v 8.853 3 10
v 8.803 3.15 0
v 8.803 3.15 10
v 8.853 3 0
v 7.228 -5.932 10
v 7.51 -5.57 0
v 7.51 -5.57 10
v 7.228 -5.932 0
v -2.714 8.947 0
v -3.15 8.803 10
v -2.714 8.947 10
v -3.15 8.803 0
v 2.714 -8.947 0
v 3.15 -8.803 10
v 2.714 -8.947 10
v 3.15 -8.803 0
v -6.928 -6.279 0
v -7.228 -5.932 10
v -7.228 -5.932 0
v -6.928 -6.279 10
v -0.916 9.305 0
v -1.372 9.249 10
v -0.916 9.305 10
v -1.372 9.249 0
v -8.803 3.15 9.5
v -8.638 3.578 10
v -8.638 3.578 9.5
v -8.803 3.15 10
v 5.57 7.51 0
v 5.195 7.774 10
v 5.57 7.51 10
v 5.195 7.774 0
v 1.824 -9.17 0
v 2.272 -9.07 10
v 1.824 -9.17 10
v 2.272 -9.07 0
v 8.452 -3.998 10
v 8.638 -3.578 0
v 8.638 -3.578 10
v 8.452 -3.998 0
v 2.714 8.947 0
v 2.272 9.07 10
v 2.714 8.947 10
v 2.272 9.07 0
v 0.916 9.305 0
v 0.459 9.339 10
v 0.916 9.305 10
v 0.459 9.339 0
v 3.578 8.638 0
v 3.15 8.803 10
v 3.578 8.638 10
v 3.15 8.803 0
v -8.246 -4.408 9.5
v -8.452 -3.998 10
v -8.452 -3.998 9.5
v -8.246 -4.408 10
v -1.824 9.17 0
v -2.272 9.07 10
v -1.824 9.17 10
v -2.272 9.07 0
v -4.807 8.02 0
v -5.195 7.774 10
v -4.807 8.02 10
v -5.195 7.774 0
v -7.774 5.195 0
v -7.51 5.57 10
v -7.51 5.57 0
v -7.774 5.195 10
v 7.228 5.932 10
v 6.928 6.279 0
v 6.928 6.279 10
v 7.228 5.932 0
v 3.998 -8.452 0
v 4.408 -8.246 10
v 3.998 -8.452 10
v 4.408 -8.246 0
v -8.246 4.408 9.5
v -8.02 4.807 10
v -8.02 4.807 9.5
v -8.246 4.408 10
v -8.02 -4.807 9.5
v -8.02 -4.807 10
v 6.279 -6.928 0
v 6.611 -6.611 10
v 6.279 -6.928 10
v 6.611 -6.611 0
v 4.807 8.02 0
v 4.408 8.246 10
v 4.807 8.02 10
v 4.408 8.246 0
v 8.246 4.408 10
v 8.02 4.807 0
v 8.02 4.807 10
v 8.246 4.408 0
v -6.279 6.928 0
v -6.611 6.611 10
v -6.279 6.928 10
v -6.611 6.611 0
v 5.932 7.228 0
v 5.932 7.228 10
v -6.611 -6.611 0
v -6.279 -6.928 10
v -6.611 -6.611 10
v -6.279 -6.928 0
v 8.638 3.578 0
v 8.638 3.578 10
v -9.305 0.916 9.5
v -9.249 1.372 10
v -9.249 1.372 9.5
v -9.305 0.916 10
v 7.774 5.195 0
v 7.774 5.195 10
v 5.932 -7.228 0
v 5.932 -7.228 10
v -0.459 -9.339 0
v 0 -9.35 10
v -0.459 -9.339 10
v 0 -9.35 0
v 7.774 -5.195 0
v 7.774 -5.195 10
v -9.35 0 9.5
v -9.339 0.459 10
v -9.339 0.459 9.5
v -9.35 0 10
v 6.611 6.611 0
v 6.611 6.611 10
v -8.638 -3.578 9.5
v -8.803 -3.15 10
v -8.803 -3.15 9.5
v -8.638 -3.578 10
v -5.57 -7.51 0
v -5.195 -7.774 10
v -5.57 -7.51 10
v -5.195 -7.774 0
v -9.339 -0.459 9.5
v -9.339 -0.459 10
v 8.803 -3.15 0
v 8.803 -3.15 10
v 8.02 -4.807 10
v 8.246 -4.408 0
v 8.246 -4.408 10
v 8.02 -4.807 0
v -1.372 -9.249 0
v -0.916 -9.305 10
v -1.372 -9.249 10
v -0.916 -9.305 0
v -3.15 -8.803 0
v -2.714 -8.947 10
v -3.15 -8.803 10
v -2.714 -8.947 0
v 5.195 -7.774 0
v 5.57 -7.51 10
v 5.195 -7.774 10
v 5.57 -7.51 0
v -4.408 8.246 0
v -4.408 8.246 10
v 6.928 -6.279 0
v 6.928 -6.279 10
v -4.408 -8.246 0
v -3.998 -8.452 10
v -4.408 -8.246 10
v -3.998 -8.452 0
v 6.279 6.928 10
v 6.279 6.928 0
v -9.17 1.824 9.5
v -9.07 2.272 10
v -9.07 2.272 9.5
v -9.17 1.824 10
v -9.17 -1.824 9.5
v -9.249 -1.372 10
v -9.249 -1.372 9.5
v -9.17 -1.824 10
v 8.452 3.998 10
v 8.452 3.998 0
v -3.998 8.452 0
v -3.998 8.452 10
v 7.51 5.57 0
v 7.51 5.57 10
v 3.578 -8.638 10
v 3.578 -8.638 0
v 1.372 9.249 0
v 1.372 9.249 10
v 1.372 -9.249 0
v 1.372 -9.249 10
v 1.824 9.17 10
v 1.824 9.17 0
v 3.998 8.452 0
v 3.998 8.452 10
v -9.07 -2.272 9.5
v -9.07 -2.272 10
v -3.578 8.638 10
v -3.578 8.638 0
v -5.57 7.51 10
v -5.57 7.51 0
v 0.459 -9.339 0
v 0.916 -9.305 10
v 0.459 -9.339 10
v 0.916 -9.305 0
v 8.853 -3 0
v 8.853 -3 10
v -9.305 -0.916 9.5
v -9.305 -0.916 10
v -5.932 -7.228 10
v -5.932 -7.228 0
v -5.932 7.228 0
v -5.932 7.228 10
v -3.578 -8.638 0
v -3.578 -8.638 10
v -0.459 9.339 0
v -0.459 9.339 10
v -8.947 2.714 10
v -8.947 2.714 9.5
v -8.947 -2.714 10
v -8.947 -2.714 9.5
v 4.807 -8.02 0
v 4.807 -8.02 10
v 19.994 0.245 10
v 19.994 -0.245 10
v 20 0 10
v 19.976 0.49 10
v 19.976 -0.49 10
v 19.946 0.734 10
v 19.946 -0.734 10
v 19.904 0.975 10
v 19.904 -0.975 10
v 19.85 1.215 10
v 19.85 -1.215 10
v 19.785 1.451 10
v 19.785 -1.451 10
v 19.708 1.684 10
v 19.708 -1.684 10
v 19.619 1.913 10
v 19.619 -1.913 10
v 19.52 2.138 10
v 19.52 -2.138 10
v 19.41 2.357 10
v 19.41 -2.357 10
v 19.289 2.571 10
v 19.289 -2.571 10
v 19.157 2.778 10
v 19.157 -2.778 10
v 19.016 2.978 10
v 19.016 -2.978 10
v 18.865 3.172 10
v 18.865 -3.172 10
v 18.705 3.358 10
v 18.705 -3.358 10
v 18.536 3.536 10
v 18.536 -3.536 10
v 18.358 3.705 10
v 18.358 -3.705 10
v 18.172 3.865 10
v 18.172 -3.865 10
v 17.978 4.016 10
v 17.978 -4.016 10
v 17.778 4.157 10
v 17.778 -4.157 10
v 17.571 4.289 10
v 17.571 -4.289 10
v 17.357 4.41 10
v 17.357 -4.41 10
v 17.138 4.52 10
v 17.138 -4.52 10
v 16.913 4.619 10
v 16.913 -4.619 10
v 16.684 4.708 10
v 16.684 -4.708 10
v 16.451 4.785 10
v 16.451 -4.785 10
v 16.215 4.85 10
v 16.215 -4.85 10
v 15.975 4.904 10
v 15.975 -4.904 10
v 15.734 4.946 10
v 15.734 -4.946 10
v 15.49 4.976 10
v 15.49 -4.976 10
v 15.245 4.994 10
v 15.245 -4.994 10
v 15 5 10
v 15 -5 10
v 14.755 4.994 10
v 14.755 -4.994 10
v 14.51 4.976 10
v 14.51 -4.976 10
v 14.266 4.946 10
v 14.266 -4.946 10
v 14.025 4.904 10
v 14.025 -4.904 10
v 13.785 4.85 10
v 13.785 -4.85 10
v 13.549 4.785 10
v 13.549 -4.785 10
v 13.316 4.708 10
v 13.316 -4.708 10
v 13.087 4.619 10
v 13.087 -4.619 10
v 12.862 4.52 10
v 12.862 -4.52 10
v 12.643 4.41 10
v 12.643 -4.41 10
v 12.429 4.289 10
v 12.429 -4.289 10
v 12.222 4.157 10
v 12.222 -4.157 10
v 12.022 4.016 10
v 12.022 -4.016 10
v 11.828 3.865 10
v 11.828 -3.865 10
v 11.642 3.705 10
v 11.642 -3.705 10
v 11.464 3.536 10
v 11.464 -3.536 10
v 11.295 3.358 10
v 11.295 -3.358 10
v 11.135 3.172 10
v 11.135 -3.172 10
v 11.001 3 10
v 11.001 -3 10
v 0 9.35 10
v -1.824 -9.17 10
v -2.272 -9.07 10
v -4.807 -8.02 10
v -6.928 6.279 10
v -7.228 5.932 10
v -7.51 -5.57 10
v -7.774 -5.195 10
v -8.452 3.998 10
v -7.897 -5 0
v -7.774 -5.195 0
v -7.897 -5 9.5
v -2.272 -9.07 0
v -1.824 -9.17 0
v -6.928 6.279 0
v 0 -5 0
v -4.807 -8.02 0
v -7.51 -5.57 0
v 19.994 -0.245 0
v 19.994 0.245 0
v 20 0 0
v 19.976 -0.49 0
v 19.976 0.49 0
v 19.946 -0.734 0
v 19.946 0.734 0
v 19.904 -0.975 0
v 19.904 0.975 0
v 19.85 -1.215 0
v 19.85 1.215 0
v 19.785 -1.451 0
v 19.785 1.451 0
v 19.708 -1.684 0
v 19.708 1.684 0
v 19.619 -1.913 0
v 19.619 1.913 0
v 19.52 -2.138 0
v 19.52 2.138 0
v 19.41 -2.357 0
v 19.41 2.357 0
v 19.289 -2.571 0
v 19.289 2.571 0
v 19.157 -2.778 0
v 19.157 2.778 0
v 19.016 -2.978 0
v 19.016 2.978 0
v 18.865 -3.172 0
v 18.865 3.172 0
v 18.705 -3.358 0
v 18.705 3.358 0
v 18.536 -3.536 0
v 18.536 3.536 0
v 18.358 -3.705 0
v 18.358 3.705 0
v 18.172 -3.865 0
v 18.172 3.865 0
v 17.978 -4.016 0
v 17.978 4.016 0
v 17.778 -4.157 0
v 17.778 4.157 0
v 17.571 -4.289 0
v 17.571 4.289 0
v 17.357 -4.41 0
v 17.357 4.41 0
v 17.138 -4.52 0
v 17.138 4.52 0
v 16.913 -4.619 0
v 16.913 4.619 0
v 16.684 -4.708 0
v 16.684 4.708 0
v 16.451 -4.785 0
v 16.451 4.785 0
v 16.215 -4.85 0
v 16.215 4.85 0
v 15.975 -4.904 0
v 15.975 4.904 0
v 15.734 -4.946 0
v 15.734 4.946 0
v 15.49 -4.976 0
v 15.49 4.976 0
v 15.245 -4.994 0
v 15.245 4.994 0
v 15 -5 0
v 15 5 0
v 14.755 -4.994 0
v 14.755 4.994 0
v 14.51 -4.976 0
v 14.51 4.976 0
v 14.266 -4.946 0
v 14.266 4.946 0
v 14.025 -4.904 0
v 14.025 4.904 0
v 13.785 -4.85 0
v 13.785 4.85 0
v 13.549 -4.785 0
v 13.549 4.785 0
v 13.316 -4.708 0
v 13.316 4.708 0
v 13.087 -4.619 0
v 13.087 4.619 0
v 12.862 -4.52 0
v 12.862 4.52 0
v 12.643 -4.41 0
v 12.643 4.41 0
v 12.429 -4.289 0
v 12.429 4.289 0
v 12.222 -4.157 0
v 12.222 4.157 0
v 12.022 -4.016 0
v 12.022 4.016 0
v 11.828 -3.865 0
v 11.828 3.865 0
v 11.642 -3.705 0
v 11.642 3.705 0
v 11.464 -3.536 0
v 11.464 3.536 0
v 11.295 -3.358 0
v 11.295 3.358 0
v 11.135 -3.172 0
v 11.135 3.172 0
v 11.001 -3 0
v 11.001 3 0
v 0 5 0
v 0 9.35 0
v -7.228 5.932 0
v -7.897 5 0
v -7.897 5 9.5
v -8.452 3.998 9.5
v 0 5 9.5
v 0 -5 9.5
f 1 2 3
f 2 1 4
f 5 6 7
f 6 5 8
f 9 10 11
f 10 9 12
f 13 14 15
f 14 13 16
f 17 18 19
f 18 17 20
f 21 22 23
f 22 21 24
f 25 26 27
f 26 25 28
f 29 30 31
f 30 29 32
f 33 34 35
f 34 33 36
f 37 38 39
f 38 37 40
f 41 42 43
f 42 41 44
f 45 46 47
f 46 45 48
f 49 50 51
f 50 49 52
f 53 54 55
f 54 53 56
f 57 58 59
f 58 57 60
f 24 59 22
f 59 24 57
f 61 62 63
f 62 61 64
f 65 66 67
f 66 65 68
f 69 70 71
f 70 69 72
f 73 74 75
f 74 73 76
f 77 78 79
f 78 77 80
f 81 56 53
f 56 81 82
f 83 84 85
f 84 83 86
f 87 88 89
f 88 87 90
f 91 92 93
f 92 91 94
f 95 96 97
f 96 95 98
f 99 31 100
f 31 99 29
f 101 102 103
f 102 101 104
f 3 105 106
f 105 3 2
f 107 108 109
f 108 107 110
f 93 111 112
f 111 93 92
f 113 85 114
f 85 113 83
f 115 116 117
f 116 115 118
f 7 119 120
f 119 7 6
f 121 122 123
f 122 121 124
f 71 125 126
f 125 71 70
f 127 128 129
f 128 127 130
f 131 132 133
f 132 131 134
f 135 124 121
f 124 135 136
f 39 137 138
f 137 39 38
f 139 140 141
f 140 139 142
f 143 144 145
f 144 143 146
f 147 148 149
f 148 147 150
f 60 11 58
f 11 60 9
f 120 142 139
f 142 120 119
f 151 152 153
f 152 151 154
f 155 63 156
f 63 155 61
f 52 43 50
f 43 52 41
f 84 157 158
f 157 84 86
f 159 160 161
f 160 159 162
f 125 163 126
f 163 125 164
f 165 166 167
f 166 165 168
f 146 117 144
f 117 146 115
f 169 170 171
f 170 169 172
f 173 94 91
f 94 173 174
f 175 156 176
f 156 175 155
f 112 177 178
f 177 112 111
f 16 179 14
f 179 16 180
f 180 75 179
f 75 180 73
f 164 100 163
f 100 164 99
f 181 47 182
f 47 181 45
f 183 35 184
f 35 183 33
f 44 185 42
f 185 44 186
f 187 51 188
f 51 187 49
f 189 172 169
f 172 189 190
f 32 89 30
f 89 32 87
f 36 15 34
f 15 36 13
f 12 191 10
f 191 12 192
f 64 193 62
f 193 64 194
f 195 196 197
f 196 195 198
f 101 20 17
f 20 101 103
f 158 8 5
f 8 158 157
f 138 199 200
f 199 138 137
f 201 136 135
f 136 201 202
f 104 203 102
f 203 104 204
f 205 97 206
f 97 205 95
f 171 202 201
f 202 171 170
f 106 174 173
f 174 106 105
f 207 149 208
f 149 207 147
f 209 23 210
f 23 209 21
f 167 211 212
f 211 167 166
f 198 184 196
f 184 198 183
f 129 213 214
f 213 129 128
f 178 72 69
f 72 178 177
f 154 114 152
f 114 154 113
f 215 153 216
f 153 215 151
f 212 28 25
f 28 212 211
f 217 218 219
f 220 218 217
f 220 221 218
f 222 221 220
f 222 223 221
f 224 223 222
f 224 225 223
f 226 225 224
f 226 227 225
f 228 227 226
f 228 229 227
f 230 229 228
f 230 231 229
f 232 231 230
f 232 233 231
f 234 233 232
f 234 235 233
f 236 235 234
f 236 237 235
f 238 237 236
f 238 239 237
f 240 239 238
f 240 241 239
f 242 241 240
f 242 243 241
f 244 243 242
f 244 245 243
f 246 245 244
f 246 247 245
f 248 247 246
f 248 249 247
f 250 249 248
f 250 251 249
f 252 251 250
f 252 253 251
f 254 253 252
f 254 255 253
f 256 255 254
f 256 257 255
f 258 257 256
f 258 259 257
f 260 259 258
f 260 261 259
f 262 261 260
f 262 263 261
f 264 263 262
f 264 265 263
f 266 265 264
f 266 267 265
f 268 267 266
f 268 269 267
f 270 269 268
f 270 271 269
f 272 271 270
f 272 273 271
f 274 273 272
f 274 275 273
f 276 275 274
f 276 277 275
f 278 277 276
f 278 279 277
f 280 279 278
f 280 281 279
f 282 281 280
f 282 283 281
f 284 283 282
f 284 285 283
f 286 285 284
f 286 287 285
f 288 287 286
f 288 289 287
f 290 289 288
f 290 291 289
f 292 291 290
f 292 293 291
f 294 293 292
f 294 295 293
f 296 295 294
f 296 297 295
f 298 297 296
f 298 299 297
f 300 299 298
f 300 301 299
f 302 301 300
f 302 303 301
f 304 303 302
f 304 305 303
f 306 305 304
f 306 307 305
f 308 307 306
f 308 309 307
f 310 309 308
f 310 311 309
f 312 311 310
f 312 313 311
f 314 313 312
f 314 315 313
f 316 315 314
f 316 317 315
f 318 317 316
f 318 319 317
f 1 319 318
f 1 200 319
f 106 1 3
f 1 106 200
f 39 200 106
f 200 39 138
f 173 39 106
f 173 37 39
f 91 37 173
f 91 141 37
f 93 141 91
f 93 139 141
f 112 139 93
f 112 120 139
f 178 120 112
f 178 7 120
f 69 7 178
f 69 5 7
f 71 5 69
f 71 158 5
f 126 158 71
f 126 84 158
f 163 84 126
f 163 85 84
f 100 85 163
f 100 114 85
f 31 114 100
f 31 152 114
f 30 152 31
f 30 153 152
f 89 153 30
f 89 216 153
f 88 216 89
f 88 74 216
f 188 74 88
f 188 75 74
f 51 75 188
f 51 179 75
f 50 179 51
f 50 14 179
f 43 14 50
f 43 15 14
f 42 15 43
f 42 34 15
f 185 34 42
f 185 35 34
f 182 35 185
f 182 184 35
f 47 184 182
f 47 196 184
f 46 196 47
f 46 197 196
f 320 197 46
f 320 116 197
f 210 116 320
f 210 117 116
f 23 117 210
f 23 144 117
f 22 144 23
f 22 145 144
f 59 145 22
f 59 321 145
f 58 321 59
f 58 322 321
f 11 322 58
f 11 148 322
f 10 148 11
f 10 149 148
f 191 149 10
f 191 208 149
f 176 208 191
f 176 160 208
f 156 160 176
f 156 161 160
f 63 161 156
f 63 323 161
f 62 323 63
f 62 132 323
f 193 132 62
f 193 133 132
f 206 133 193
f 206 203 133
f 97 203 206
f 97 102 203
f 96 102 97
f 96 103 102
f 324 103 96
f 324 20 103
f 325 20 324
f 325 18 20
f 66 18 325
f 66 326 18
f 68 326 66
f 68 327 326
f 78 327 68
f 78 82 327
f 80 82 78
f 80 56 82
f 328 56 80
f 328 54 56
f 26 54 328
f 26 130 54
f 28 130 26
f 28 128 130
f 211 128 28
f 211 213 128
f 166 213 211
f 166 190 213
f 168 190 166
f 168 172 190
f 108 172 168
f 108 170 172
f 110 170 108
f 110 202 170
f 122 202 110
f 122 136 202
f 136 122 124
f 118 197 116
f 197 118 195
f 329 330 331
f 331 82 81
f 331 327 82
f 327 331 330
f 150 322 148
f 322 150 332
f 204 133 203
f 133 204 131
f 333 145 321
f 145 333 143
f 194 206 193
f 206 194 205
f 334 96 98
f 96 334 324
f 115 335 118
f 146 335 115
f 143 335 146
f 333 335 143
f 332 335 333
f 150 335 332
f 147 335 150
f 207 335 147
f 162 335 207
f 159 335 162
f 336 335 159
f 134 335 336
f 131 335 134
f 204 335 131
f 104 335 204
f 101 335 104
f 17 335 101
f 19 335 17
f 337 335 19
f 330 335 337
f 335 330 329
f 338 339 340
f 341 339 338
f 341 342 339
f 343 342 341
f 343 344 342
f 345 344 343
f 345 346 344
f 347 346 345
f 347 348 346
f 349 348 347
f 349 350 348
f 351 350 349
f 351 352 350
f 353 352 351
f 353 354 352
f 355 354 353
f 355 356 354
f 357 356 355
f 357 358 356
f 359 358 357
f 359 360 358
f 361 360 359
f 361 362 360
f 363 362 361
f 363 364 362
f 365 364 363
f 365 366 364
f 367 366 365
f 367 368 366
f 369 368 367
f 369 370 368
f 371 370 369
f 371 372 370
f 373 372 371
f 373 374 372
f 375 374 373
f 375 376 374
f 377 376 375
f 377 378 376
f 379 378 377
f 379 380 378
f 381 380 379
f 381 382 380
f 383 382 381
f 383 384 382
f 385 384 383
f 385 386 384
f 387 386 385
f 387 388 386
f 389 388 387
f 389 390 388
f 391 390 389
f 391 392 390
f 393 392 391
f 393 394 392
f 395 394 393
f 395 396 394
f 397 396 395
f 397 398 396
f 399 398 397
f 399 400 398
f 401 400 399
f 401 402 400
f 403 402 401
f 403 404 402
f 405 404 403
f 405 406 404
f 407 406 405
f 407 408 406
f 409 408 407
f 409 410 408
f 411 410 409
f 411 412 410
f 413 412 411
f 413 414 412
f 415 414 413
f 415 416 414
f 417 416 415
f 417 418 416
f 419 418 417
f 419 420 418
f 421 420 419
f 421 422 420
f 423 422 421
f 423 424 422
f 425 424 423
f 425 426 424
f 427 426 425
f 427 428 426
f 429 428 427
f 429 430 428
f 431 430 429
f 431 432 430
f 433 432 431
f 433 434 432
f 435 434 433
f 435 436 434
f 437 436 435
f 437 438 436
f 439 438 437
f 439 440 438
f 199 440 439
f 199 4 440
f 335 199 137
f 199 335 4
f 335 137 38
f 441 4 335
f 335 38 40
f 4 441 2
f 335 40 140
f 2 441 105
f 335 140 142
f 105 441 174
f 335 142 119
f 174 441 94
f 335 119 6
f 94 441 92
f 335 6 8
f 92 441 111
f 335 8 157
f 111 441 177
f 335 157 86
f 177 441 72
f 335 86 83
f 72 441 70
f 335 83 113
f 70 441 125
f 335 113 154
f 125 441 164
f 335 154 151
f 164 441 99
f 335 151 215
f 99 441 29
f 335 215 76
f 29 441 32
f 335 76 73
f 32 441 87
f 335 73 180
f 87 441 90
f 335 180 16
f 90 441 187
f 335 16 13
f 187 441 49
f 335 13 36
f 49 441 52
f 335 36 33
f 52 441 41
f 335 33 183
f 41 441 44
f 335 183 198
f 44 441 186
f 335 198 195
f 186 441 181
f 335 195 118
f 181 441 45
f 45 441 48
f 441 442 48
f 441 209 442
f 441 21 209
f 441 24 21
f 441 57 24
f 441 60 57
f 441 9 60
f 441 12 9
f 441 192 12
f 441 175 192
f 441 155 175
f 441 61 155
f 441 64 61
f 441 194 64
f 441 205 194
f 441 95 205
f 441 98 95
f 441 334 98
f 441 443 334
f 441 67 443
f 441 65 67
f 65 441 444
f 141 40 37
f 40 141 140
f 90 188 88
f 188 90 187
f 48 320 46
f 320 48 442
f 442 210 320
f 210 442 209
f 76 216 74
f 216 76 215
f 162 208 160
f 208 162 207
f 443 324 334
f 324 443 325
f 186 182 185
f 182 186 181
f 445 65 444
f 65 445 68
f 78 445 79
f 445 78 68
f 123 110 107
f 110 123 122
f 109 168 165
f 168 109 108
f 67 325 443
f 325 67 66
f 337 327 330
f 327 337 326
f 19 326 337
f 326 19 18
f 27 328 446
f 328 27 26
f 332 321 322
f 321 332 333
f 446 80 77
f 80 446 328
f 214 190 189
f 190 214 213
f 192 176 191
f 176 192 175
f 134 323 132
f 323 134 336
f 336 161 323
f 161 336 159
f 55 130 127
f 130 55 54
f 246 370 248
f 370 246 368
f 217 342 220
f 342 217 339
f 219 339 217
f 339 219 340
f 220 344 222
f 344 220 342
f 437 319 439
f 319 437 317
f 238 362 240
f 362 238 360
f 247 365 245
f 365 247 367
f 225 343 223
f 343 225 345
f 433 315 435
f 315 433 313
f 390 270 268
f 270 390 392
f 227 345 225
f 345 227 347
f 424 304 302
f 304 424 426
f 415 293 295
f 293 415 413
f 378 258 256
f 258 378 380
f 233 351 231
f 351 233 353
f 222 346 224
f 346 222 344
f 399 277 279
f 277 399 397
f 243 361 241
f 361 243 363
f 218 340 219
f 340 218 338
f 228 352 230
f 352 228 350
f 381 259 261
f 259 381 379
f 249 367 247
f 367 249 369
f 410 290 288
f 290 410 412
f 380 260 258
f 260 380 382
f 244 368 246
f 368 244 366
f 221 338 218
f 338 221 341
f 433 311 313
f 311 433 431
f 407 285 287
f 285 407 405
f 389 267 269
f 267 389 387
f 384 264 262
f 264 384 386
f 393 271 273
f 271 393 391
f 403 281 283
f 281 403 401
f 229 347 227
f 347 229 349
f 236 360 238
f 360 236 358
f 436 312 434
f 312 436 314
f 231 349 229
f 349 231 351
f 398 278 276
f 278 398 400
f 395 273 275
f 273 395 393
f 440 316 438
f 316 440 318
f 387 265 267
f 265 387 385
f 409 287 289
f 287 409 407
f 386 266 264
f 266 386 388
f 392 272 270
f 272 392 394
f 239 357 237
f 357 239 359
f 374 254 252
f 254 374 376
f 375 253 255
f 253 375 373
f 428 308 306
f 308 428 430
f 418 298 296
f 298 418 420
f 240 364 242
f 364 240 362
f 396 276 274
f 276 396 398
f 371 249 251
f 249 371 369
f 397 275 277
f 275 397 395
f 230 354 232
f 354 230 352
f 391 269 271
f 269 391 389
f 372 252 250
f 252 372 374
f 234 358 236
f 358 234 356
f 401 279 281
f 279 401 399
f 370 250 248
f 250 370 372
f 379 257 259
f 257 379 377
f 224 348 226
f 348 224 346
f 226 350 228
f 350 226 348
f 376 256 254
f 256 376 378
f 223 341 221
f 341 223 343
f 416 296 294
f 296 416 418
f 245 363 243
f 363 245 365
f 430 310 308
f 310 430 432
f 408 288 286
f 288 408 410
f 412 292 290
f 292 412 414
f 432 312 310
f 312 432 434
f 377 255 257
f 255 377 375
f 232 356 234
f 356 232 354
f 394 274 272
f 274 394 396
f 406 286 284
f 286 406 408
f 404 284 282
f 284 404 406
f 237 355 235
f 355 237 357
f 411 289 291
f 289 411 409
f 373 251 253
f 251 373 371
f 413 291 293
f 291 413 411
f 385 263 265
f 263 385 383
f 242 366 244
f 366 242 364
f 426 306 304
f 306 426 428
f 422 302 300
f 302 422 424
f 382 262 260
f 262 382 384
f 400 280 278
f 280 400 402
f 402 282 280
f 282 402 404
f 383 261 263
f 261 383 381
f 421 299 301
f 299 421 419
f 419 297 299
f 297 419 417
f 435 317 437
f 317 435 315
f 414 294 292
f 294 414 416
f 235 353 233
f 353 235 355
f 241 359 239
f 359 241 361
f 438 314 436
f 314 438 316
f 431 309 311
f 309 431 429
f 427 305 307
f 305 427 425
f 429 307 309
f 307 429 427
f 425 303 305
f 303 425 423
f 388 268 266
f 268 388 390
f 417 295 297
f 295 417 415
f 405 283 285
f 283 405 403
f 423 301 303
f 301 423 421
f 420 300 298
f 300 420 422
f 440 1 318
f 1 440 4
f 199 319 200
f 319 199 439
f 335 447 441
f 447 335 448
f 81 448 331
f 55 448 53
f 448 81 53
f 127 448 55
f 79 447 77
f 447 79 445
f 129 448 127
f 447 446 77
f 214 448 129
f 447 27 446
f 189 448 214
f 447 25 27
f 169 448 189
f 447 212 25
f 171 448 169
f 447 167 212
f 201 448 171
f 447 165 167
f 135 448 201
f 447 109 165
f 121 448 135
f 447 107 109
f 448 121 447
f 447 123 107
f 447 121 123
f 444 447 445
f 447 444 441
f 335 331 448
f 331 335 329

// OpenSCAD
// Tubing clip for a 12.7 mm (1/2 inch) lab stand rod
// Print orientation: flat on the bed, extruded upward in +Z

// ---------------- Parameters ----------------
rod_d      = 12.7;   // stand rod diameter
ring_w     = 3;      // rod ring wall thickness
ring_od    = rod_d + 2 * ring_w;  // rod ring outer diameter (18.7 mm)
ring_id    = rod_d;  // rod ring inner diameter (12.7 mm)

tub_d      = 6;      // tubing ring inner diameter
tub_w      = 2;      // tubing ring wall thickness
tub_od     = tub_d + 2 * tub_w;   // tubing ring outer diameter (10 mm)
tub_x      = 15;     // tubing ring centre X position

bridge_x0  = 8;      // bridge start (X)
bridge_x1  = 12;     // bridge end (X)
bridge_w   = 6;      // bridge width (Y)

eps        = 0.5;    // cutter overshoot past faces

$fn = 128;           // smoothness of curved shapes

// ---------------- Model ----------------
difference() {
    union() {
        // Rod ring
        cylinder(d = ring_od, h = 10);

        // Tubing ring
        translate([tub_x, 0, 0])
            cylinder(d = tub_od, h = 10);

        // Solid bridge between the rings
        translate([bridge_x0, -bridge_w / 2, 0])
            cube([bridge_x1 - bridge_x0, bridge_w, 10]);
    }

    // Opening in the rod ring on the -X side
    translate([0, 0, -eps])
        intersection() {
            translate([-ring_od / 2 - eps, -5, 0])
                cube([ring_od / 2 + eps, 10, 10]);
        }

    // Opening in the tubing ring on the +X side
    translate([tub_x, 0, -eps])
        intersection() {
            translate([tub_x - tub_od / 2 - eps, -2.25, 0])
                cube([tub_od / 2 + eps, 4.5, 10]);
        }
}
